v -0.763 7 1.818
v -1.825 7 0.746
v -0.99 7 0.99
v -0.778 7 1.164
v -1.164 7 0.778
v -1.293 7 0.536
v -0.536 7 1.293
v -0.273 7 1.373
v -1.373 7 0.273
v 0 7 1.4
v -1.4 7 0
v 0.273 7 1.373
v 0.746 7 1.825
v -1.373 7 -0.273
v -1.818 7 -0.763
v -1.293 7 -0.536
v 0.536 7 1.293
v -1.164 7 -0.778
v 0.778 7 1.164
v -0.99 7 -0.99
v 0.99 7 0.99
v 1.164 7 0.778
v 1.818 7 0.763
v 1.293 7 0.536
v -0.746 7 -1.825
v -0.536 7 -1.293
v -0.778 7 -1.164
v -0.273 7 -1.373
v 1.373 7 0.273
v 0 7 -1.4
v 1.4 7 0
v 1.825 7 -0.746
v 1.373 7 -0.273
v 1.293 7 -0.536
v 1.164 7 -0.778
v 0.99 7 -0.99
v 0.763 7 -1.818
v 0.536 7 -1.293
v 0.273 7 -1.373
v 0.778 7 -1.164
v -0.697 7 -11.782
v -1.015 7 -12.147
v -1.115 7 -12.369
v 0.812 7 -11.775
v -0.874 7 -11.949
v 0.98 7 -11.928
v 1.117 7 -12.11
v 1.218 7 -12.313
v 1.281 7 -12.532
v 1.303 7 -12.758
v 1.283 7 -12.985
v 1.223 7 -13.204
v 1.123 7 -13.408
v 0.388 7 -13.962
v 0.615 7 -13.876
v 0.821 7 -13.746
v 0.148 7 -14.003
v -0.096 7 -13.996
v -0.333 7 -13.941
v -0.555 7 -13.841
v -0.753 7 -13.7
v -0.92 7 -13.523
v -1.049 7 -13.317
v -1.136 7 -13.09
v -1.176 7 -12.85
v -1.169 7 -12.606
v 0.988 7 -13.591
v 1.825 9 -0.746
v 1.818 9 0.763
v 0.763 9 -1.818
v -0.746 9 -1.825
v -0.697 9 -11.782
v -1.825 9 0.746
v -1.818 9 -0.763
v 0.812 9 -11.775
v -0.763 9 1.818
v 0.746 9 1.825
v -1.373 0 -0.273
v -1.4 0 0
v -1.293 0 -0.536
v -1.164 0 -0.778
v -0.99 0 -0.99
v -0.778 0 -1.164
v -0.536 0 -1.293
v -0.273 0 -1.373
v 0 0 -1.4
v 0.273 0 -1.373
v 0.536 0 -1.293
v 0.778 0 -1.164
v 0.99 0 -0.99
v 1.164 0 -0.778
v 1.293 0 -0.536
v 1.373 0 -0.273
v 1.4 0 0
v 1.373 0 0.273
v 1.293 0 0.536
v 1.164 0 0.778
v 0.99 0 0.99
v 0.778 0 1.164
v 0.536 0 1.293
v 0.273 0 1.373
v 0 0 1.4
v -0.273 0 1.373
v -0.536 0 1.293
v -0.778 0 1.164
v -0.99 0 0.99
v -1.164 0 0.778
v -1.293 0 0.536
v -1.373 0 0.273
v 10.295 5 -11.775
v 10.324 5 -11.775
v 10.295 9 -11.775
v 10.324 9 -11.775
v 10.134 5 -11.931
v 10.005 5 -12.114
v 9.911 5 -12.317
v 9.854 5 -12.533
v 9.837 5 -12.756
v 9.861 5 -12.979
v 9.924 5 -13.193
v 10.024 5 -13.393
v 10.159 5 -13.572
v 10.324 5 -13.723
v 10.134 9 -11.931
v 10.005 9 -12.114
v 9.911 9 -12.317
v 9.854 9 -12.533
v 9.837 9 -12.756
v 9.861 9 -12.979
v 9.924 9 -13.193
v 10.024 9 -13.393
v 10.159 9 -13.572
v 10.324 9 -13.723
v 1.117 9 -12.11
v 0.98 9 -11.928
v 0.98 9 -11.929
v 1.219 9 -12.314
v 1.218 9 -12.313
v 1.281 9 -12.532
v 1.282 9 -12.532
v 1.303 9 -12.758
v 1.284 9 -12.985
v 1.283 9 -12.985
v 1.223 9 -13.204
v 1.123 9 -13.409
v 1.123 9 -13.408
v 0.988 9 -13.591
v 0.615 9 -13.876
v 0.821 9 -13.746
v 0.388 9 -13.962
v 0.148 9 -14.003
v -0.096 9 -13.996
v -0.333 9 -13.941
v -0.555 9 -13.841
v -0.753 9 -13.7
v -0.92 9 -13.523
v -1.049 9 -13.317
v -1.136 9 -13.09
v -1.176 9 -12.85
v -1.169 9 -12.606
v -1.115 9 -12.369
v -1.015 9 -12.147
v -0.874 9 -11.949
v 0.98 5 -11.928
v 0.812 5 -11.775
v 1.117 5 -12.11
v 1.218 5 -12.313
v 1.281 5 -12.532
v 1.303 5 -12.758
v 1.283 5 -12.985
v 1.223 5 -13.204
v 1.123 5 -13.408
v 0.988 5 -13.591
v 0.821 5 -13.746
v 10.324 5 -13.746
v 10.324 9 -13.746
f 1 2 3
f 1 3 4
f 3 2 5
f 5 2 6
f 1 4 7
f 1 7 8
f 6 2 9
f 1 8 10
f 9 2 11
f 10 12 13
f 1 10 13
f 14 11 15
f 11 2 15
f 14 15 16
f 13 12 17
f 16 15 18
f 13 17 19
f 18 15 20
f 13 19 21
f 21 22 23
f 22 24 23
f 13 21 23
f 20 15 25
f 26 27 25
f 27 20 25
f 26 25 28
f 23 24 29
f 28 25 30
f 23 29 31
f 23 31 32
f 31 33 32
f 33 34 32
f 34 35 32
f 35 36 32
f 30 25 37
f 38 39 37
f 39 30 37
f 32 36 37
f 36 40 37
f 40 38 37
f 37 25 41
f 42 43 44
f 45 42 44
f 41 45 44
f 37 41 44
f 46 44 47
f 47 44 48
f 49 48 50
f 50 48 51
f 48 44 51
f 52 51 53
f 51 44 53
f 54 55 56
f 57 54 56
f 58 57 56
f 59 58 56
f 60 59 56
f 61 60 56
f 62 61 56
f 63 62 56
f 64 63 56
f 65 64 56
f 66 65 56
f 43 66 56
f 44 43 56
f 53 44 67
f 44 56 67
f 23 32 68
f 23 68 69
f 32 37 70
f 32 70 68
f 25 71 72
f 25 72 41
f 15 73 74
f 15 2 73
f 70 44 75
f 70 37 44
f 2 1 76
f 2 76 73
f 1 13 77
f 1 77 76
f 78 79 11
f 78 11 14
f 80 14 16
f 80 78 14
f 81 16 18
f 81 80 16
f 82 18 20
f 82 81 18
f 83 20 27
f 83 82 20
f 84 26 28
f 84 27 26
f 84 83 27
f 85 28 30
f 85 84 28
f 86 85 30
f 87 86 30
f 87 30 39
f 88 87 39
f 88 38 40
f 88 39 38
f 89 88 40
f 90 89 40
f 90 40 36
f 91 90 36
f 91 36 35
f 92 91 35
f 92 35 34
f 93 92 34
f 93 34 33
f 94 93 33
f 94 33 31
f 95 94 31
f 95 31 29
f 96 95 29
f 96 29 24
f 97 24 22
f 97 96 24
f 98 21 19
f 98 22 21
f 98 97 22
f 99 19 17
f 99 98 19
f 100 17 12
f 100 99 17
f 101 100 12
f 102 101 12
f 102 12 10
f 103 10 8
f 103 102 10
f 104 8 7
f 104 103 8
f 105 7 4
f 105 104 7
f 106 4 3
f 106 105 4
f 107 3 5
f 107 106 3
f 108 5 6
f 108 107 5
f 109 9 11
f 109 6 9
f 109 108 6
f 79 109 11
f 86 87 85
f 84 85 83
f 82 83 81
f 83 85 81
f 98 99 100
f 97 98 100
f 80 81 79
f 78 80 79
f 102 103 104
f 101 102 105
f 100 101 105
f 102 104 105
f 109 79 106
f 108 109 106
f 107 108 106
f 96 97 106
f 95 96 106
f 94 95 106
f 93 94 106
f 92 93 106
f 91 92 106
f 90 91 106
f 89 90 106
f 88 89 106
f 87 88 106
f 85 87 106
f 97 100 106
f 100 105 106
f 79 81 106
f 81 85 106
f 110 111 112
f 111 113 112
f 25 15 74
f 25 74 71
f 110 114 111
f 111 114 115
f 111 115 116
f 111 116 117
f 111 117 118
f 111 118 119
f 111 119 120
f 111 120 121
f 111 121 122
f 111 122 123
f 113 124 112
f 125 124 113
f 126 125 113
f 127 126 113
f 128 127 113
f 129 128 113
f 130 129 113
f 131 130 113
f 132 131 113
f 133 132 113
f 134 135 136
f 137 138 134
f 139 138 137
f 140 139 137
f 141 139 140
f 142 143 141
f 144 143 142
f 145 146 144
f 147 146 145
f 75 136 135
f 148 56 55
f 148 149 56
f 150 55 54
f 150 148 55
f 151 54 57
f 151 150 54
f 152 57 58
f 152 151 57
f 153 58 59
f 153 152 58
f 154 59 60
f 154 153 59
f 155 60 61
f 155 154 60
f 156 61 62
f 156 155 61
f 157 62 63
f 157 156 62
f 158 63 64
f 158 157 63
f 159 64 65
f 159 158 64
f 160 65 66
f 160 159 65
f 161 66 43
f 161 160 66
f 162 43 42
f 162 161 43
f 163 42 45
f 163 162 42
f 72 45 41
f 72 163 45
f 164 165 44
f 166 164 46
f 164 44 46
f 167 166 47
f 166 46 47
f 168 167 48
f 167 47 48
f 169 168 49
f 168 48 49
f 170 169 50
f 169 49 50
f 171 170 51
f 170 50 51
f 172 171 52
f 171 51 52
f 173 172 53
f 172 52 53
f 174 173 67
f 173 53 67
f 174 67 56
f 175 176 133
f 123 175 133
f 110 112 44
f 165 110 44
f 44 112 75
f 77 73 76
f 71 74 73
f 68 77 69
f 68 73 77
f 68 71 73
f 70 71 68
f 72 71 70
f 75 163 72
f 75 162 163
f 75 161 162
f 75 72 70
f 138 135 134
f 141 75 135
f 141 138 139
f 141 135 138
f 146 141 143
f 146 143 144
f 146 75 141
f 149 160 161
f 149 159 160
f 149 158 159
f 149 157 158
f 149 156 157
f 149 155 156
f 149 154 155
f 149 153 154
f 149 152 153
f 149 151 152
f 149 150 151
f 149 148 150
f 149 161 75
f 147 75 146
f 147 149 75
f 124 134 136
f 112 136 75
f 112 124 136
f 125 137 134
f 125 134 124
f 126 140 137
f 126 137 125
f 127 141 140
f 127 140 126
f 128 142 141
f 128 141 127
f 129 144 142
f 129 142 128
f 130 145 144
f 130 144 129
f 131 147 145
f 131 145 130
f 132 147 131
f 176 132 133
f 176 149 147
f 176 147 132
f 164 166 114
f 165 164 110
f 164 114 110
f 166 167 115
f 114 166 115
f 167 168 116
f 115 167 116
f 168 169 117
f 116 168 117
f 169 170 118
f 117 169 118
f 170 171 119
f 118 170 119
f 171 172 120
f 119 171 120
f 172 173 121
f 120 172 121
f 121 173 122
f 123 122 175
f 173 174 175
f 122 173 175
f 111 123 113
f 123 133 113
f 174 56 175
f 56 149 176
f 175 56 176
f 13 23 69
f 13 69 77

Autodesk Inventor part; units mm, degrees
ref_plane "YZ Plane" through (0, 0, 0) normal (1, 0, 0) x (0, 1, 0)
ref_plane "XZ Plane" through (0, 0, 0) normal (0, 1, 0) x (-1, 0, 0)
ref_plane "XY Plane" through (0, 0, 0) normal (0, 0, 1) x (1, 0, 0)
sketch "Sketch1" plane through (0, 0, 0) normal (0, 1, 0) x (-1, 0, 0)
  circle A0 centre (0, 0) radius 1.4
  dimension "d0" = 2.8
sketch "Sketch2" plane through (0, 0, 0) normal (0, 1, 0) x (-1, 0, 0)
  point P0 (0, 0)
extrude "Extrusion1" add sketch "Sketch1" along normal blind 7
sketch "Sketch3" plane through (0, 7, 0) normal (0, 1, 0) x (1, 0, 0)
  line L0 (1.8253, 0.7457) -> (1.818, -0.7634)
  line L1 (1.818, -0.7634) -> (0.7457, -1.8253)
  line L2 (0.7457, -1.8253) -> (-0.7634, -1.818)
  line L3 (-0.7634, -1.818) -> (-1.8253, -0.7457)
  line L4 (-1.8253, -0.7457) -> (-1.818, 0.7634)
  line L5 (-1.818, 0.7634) -> (-0.7457, 1.8253)
  line L6 (-0.7457, 1.8253) -> (0.7634, 1.818)
  line L7 (0.7634, 1.818) -> (1.8253, 0.7457)
  line L8 (-1.8216, 0.0088) -> (1.8216, -0.0088) construction
  line L9 (-0.0088, -1.8216) -> (0.0088, 1.8216) construction
  point P0 (0, 0)
  point P1 (0, 0)
  point P2 (0, 0)
  point P3 (0, 0)
extrude "Extrusion2" add sketch "Sketch3" along normal blind 2
sketch "Sketch4" plane through (-0.7457, 7, -1.8253) normal (0.0049, 0, -1) x (-1, 0, -0.0049)
  line L0 (-1.5091, 2) -> (0, 2)
  line L1 (0, 2) -> (0, 0)
  line L2 (0, 0) -> (-1.5091, 0)
  line L3 (-1.5091, 0) -> (-1.5091, 2)
  point P0 (-0.7546, -7)
extrude "Extrusion3" add sketch "Sketch4" along normal blind 10
sketch "Sketch5" plane through (0, 9, 0) normal (0, 1, 0) x (1, 0, 0)
  point P0 (0, 0)
sketch "Sketch6" plane through (0, 9, 0) normal (0, 1, 0) x (1, 0, 0)
  point P0 (0, 0)
thread "Thread1" size "M3x0.5" class "6g" standard "ANSI Metric M Profile" full length
sketch "Sketch7" plane through (0, 9, 0) normal (0, 1, 0) x (1, 0, 0)
  circle A0 centre (0.062, 12.7642) radius 1.2414
  point P0 (0, 0)
extrude "Extrusion4" add sketch "Sketch7" against normal blind 2
sketch "Sketch8" plane through (0, 9, 0) normal (0, 1, 0) x (1, 0, 0)
  point P0 (0, 0)
sketch "Sketch9" plane through (0, 9, 0) normal (0, 1, 0) x (1, 0, 0)
  point P0 (0, 0)
sketch "Sketch10" plane through (0, 9, 0) normal (0, 1, 0) x (1, 0, 0)
  line L0 (0.8117, 11.7749) -> (0.8213, 13.7463)
  arc A0 (0.8117, 11.7749) -> (-0.6974, 11.7822) centre (0.062, 12.7642) ccw projected
  line L1 (0.7634, 1.818) -> (0.8117, 11.7749) projected
  line L2 (0.8213, 13.7463) -> (10.3239, 13.7463)
  line L3 (10.3239, 13.7463) -> (10.3239, 11.7749)
  line L4 (10.3239, 11.7749) -> (0.8117, 11.7749)
  line L5 (5.5726, 13.7463) -> (5.5678, 11.7749) construction
  arc A1 (11.8329, 11.7518) -> (10.3238, 11.7518) centre (11.0784, 12.7375) ccw
  arc A2 (10.3238, 11.7518) -> (11.8329, 11.7518) centre (11.0784, 12.7375) ccw
  point P0 (0, 0)
extrude "Extrusion5" add sketch "Sketch10" against normal blind 4 contours A0 L2 L3 A1 L4 | A1 L3 L4
sketch "Sketch11" plane through (0, 9, 0) normal (0, 1, 0) x (1, 0, 0)
  point P0 (0, 0)
properties part number "Servo_Arm_Hook"
